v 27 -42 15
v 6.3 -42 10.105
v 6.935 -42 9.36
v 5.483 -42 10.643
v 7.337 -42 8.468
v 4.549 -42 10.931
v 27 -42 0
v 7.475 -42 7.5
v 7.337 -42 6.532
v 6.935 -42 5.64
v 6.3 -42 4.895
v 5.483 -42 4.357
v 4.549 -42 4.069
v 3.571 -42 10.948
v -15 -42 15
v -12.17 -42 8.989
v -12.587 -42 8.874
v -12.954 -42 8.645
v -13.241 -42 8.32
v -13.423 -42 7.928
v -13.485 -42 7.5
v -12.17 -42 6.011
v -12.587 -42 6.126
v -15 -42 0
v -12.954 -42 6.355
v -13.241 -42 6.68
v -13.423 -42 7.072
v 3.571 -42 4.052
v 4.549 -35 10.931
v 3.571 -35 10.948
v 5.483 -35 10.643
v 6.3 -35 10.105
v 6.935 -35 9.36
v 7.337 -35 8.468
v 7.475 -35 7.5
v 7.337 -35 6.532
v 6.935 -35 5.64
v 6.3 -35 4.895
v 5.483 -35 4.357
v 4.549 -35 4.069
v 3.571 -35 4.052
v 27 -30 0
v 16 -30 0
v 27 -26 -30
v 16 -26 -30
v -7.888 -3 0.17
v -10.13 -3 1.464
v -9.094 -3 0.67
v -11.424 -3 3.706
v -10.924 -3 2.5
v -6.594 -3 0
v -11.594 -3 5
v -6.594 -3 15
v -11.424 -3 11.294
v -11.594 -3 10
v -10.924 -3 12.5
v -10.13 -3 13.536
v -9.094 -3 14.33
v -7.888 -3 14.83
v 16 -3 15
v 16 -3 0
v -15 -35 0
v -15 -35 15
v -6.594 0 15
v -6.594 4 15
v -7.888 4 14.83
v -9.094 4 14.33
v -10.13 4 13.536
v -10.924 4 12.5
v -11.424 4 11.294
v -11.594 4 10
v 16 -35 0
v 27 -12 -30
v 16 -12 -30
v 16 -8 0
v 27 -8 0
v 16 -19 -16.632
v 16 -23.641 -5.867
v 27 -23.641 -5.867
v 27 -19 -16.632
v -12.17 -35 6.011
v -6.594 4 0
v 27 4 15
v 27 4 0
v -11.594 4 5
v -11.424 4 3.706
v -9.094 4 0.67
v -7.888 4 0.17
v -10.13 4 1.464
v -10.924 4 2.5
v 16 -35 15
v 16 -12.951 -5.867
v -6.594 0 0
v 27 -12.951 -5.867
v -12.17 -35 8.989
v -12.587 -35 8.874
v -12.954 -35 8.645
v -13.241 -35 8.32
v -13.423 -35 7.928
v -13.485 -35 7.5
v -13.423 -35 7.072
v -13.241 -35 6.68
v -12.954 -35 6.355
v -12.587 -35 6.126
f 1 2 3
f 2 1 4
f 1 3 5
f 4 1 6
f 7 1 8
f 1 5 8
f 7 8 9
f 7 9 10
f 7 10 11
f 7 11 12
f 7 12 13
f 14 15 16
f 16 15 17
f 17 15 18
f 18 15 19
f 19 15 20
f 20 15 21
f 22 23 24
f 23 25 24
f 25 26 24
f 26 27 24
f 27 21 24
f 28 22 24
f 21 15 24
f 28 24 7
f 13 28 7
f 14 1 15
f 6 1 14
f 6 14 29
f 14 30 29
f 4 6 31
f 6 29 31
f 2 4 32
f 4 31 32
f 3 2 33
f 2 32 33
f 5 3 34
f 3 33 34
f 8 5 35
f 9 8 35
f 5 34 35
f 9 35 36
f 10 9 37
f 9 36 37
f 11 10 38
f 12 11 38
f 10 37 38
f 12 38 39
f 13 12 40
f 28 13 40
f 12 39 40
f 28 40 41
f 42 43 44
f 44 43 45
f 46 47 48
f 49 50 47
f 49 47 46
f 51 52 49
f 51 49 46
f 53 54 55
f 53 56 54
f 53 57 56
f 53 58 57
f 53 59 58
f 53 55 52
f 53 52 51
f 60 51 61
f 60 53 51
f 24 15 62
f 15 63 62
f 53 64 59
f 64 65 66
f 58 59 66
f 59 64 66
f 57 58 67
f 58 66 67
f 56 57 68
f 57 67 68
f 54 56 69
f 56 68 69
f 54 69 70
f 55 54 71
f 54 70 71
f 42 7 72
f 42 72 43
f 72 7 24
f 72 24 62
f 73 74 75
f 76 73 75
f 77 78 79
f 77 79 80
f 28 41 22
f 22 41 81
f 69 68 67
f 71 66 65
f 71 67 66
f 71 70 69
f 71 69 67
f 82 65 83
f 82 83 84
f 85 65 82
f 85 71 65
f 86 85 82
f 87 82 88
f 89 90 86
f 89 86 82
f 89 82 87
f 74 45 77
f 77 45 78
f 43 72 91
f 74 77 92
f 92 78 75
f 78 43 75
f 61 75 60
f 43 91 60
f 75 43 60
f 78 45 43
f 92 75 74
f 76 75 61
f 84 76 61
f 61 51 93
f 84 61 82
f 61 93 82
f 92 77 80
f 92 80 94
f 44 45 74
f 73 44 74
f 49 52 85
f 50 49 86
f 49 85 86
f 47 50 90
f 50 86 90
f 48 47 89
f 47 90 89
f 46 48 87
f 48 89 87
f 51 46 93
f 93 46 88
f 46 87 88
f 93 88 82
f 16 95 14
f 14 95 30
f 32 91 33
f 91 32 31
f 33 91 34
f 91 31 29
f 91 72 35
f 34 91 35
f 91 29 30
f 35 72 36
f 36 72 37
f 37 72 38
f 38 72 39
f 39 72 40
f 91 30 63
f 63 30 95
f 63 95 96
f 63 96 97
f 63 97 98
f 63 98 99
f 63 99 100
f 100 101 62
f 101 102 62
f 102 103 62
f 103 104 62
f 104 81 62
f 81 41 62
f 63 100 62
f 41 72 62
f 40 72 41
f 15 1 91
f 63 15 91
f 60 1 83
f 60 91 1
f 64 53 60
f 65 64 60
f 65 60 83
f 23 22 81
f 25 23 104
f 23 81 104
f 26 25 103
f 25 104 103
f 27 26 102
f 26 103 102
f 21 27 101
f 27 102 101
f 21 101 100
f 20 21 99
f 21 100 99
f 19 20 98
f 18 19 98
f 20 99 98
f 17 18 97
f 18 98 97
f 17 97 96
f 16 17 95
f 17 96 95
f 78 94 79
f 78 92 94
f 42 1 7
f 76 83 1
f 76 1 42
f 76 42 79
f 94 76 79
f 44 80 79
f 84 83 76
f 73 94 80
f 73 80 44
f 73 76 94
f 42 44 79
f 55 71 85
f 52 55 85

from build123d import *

# Parameters (mm, degrees)
EXTRUDE_1_DEPTH     = 15
SKETCH_3_W          = 15
SKETCH_3_H          = 3
EXTRUDE_2_DEPTH     = 15
CUT_EXTRUDE_1_DEPTH = 15
SKETCH_5_W          = 15
SKETCH_5_H          = 38
EXTRUDE_3_DEPTH     = 10
SKETCH_6_W          = 8
SKETCH_6_H          = 32
CUT_EXTRUDE_2_DEPTH = 22
SKETCH_7_W          = 7
SKETCH_7_H          = 22
EXTRUDE_4_DEPTH     = 30
CUT_EXTRUDE_3_DEPTH = 30
CUT_EXTRUDE_4_DEPTH = 30
SKETCH_10_W         = 3.405660377
SKETCH_10_H         = 15
CUT_EXTRUDE_5_DEPTH = 10
CUT_EXTRUDE_6_DEPTH = 10
SKETCH_12_W         = 38
SKETCH_12_H         = 15
EXTRUDE_5_DEPTH     = 4
EXTRUDE_START       = 4
SKETCH_13_W         = 29.594339623
SKETCH_13_H         = 15
EXTRUDE_6_DEPTH     = 4
SKETCH_14_W         = 15
SKETCH_14_H         = 46
EXTRUDE_7_DEPTH     = 4
EXTRUDE_9_DEPTH     = 4


with BuildPart() as part:
    # 草图1 → 凸台-拉伸1 (new body)
    with BuildSketch(Plane.XY):
        Polygon((13, 0), (0, 0), (0, -3), (8, -3), (8, -35), (0, -35), (0, -38), (13, -38), align=None)
    extrude(amount=EXTRUDE_1_DEPTH)

    # 草图3 → 凸台-拉伸2 (add)
    with BuildSketch(Plane.ZY):
        with Locations((7.5, -1.5)):
            Rectangle(SKETCH_3_W, SKETCH_3_H)
        with Locations((7.5, -36.5)):
            Rectangle(SKETCH_3_W, SKETCH_3_H)
    extrude(amount=EXTRUDE_2_DEPTH)

    # 草图4 → 切除-拉伸1 (cut)
    with BuildSketch(Plane.XZ.offset(38)):
        with BuildLine():
            Line((-12.170329997, 8.9885069), (3.570652174, 10.948374319))
            ThreePointArc((3.570652174, 10.948374319), (7.475, 7.5), (3.570652174, 4.051625681))
            Line((3.570652174, 4.051625681), (-12.170329997, 6.0114931))
            ThreePointArc((-12.170329997, 6.0114931), (-13.485, 7.5), (-12.170329997, 8.9885069))
        make_face()
    extrude(amount=-CUT_EXTRUDE_1_DEPTH, mode=Mode.SUBTRACT)

    # 草图5 → 凸台-拉伸3 (add)
    with BuildSketch(Plane(origin=(13, 0, 0), x_dir=(0, 0, -1), z_dir=(1, 0, 0))):
        with Locations((-7.5, -19)):
            Rectangle(SKETCH_5_W, SKETCH_5_H)
    extrude(amount=EXTRUDE_3_DEPTH)

    # 草图6 → 切除-拉伸2 (cut)
    with BuildSketch(Plane.XY.offset(15)):
        with Locations((12, -19)):
            Rectangle(SKETCH_6_W, SKETCH_6_H)
    extrude(amount=-CUT_EXTRUDE_2_DEPTH, mode=Mode.SUBTRACT)

    # 草图7 → 凸台-拉伸4 (add)
    with BuildSketch(Plane(origin=(0, 0, 0), x_dir=(-1, 0, 0), z_dir=(0, 0, -1))):
        with Locations((-19.5, -19)):
            Rectangle(SKETCH_7_W, SKETCH_7_H)
    extrude(amount=EXTRUDE_4_DEPTH)

    # 草图8 → 切除-拉伸3 (cut)
    with BuildSketch(Plane(origin=(23, 0, 0), x_dir=(0, 0, -1), z_dir=(1, 0, 0))):
        Polygon((0, -8), (30, -12), (30, -8), align=None)
        Polygon((0, -30), (30, -30), (30, -26), align=None)
    extrude(amount=-CUT_EXTRUDE_3_DEPTH, mode=Mode.SUBTRACT)

    # 草图9 → 切除-拉伸4 (cut)
    with BuildSketch(Plane(origin=(23, 0, 0), x_dir=(0, 0, -1), z_dir=(1, 0, 0))):
        Polygon((5.866710017, -12.950612604), (5.866710017, -19), (5.866710017, -23.641237949), (16.631575815, -19), align=None)
    extrude(amount=-CUT_EXTRUDE_4_DEPTH, mode=Mode.SUBTRACT)

    # 草图10 → 切除-拉伸5 (cut)
    with BuildSketch(Plane(origin=(0, 0, 0), x_dir=(1, 0, 0), z_dir=(0, 1, 0))):
        with Locations((-13.297169812, -7.5)):
            Rectangle(SKETCH_10_W, SKETCH_10_H)
    extrude(amount=-CUT_EXTRUDE_5_DEPTH, mode=Mode.SUBTRACT)

    # 草图11 → 切除-拉伸6 (cut)
    with BuildSketch(Plane(origin=(0, 0, 0), x_dir=(1, 0, 0), z_dir=(0, 1, 0))):
        with BuildLine():
            ThreePointArc((-6.594339623, -15), (-10.129873529, -13.535533906), (-11.594339623, -10))
            Line((-11.594339623, -10), (-11.594339623, -15))
            Line((-11.594339623, -15), (-6.594339623, -15))
        make_face()
        with BuildLine():
            Line((-11.594339623, 0), (-11.594339623, -5))
            ThreePointArc((-11.594339623, -5), (-10.129873529, -1.464466094), (-6.594339623, 0))
            Line((-6.594339623, 0), (-11.594339623, 0))
        make_face()
    extrude(amount=-CUT_EXTRUDE_6_DEPTH, mode=Mode.SUBTRACT)

    # 草图13 → 凸台-拉伸6 (add)
    with BuildSketch(Plane(origin=(0, 0, 0), x_dir=(1, 0, 0), z_dir=(0, 1, 0)).offset(EXTRUDE_START)):
        with BuildLine():
            Line((-6.594339623, 0), (-6.594339623, -15))
            ThreePointArc((-6.594339623, -15), (-10.129873529, -13.535533906), (-11.594339623, -10))
            Line((-11.594339623, -10), (-11.594339623, -5))
            ThreePointArc((-11.594339623, -5), (-10.129873529, -1.464466094), (-6.594339623, 0))
        make_face()
        with Locations((8.202830189, -7.5)):
            Rectangle(SKETCH_13_W, SKETCH_13_H)
    extrude(amount=-EXTRUDE_6_DEPTH)



with BuildPart() as body_2:
    # 草图12 → 凸台-拉伸5 (new body)
    with BuildSketch(Plane(origin=(0, -38, 0), x_dir=(-1, 0, 0), z_dir=(0, -1, 0))):
        with Locations((-4, -7.5)):
            Rectangle(SKETCH_12_W, SKETCH_12_H)
        with BuildLine():
            ThreePointArc((-3.570652174, -10.948374319), (-7.475, -7.5), (-3.570652174, -4.051625681))
            Line((-3.570652174, -4.051625681), (12.170329997, -6.0114931))
            ThreePointArc((12.170329997, -6.0114931), (13.485, -7.5), (12.170329997, -8.9885069))
            Line((12.170329997, -8.9885069), (-3.570652174, -10.948374319))
        make_face(mode=Mode.SUBTRACT)
    extrude(amount=EXTRUDE_5_DEPTH)


with BuildPart() as part_1:
    add(part.part)

    add(body_2.part)  # 凸台-拉伸7 merges body 2
    # 草图14 → 凸台-拉伸7 (add)
    with BuildSketch(Plane(origin=(23, 0, 0), x_dir=(0, 0, -1), z_dir=(1, 0, 0))):
        with Locations((-7.5, -19)):
            Rectangle(SKETCH_14_W, SKETCH_14_H)
    extrude(amount=EXTRUDE_7_DEPTH)

    # 草图15 → 凸台-拉伸9 (add)
    with BuildSketch(Plane(origin=(23, 0, 0), x_dir=(0, 0, -1), z_dir=(1, 0, 0))):
        Polygon((0, -8), (0, -30), (30, -26), (30, -12), align=None)
        Polygon((5.866710017, -12.950612604), (5.866710017, -23.641237949), (16.631575815, -19), align=None, mode=Mode.SUBTRACT)
    extrude(amount=EXTRUDE_9_DEPTH)


solid = part_1.part
